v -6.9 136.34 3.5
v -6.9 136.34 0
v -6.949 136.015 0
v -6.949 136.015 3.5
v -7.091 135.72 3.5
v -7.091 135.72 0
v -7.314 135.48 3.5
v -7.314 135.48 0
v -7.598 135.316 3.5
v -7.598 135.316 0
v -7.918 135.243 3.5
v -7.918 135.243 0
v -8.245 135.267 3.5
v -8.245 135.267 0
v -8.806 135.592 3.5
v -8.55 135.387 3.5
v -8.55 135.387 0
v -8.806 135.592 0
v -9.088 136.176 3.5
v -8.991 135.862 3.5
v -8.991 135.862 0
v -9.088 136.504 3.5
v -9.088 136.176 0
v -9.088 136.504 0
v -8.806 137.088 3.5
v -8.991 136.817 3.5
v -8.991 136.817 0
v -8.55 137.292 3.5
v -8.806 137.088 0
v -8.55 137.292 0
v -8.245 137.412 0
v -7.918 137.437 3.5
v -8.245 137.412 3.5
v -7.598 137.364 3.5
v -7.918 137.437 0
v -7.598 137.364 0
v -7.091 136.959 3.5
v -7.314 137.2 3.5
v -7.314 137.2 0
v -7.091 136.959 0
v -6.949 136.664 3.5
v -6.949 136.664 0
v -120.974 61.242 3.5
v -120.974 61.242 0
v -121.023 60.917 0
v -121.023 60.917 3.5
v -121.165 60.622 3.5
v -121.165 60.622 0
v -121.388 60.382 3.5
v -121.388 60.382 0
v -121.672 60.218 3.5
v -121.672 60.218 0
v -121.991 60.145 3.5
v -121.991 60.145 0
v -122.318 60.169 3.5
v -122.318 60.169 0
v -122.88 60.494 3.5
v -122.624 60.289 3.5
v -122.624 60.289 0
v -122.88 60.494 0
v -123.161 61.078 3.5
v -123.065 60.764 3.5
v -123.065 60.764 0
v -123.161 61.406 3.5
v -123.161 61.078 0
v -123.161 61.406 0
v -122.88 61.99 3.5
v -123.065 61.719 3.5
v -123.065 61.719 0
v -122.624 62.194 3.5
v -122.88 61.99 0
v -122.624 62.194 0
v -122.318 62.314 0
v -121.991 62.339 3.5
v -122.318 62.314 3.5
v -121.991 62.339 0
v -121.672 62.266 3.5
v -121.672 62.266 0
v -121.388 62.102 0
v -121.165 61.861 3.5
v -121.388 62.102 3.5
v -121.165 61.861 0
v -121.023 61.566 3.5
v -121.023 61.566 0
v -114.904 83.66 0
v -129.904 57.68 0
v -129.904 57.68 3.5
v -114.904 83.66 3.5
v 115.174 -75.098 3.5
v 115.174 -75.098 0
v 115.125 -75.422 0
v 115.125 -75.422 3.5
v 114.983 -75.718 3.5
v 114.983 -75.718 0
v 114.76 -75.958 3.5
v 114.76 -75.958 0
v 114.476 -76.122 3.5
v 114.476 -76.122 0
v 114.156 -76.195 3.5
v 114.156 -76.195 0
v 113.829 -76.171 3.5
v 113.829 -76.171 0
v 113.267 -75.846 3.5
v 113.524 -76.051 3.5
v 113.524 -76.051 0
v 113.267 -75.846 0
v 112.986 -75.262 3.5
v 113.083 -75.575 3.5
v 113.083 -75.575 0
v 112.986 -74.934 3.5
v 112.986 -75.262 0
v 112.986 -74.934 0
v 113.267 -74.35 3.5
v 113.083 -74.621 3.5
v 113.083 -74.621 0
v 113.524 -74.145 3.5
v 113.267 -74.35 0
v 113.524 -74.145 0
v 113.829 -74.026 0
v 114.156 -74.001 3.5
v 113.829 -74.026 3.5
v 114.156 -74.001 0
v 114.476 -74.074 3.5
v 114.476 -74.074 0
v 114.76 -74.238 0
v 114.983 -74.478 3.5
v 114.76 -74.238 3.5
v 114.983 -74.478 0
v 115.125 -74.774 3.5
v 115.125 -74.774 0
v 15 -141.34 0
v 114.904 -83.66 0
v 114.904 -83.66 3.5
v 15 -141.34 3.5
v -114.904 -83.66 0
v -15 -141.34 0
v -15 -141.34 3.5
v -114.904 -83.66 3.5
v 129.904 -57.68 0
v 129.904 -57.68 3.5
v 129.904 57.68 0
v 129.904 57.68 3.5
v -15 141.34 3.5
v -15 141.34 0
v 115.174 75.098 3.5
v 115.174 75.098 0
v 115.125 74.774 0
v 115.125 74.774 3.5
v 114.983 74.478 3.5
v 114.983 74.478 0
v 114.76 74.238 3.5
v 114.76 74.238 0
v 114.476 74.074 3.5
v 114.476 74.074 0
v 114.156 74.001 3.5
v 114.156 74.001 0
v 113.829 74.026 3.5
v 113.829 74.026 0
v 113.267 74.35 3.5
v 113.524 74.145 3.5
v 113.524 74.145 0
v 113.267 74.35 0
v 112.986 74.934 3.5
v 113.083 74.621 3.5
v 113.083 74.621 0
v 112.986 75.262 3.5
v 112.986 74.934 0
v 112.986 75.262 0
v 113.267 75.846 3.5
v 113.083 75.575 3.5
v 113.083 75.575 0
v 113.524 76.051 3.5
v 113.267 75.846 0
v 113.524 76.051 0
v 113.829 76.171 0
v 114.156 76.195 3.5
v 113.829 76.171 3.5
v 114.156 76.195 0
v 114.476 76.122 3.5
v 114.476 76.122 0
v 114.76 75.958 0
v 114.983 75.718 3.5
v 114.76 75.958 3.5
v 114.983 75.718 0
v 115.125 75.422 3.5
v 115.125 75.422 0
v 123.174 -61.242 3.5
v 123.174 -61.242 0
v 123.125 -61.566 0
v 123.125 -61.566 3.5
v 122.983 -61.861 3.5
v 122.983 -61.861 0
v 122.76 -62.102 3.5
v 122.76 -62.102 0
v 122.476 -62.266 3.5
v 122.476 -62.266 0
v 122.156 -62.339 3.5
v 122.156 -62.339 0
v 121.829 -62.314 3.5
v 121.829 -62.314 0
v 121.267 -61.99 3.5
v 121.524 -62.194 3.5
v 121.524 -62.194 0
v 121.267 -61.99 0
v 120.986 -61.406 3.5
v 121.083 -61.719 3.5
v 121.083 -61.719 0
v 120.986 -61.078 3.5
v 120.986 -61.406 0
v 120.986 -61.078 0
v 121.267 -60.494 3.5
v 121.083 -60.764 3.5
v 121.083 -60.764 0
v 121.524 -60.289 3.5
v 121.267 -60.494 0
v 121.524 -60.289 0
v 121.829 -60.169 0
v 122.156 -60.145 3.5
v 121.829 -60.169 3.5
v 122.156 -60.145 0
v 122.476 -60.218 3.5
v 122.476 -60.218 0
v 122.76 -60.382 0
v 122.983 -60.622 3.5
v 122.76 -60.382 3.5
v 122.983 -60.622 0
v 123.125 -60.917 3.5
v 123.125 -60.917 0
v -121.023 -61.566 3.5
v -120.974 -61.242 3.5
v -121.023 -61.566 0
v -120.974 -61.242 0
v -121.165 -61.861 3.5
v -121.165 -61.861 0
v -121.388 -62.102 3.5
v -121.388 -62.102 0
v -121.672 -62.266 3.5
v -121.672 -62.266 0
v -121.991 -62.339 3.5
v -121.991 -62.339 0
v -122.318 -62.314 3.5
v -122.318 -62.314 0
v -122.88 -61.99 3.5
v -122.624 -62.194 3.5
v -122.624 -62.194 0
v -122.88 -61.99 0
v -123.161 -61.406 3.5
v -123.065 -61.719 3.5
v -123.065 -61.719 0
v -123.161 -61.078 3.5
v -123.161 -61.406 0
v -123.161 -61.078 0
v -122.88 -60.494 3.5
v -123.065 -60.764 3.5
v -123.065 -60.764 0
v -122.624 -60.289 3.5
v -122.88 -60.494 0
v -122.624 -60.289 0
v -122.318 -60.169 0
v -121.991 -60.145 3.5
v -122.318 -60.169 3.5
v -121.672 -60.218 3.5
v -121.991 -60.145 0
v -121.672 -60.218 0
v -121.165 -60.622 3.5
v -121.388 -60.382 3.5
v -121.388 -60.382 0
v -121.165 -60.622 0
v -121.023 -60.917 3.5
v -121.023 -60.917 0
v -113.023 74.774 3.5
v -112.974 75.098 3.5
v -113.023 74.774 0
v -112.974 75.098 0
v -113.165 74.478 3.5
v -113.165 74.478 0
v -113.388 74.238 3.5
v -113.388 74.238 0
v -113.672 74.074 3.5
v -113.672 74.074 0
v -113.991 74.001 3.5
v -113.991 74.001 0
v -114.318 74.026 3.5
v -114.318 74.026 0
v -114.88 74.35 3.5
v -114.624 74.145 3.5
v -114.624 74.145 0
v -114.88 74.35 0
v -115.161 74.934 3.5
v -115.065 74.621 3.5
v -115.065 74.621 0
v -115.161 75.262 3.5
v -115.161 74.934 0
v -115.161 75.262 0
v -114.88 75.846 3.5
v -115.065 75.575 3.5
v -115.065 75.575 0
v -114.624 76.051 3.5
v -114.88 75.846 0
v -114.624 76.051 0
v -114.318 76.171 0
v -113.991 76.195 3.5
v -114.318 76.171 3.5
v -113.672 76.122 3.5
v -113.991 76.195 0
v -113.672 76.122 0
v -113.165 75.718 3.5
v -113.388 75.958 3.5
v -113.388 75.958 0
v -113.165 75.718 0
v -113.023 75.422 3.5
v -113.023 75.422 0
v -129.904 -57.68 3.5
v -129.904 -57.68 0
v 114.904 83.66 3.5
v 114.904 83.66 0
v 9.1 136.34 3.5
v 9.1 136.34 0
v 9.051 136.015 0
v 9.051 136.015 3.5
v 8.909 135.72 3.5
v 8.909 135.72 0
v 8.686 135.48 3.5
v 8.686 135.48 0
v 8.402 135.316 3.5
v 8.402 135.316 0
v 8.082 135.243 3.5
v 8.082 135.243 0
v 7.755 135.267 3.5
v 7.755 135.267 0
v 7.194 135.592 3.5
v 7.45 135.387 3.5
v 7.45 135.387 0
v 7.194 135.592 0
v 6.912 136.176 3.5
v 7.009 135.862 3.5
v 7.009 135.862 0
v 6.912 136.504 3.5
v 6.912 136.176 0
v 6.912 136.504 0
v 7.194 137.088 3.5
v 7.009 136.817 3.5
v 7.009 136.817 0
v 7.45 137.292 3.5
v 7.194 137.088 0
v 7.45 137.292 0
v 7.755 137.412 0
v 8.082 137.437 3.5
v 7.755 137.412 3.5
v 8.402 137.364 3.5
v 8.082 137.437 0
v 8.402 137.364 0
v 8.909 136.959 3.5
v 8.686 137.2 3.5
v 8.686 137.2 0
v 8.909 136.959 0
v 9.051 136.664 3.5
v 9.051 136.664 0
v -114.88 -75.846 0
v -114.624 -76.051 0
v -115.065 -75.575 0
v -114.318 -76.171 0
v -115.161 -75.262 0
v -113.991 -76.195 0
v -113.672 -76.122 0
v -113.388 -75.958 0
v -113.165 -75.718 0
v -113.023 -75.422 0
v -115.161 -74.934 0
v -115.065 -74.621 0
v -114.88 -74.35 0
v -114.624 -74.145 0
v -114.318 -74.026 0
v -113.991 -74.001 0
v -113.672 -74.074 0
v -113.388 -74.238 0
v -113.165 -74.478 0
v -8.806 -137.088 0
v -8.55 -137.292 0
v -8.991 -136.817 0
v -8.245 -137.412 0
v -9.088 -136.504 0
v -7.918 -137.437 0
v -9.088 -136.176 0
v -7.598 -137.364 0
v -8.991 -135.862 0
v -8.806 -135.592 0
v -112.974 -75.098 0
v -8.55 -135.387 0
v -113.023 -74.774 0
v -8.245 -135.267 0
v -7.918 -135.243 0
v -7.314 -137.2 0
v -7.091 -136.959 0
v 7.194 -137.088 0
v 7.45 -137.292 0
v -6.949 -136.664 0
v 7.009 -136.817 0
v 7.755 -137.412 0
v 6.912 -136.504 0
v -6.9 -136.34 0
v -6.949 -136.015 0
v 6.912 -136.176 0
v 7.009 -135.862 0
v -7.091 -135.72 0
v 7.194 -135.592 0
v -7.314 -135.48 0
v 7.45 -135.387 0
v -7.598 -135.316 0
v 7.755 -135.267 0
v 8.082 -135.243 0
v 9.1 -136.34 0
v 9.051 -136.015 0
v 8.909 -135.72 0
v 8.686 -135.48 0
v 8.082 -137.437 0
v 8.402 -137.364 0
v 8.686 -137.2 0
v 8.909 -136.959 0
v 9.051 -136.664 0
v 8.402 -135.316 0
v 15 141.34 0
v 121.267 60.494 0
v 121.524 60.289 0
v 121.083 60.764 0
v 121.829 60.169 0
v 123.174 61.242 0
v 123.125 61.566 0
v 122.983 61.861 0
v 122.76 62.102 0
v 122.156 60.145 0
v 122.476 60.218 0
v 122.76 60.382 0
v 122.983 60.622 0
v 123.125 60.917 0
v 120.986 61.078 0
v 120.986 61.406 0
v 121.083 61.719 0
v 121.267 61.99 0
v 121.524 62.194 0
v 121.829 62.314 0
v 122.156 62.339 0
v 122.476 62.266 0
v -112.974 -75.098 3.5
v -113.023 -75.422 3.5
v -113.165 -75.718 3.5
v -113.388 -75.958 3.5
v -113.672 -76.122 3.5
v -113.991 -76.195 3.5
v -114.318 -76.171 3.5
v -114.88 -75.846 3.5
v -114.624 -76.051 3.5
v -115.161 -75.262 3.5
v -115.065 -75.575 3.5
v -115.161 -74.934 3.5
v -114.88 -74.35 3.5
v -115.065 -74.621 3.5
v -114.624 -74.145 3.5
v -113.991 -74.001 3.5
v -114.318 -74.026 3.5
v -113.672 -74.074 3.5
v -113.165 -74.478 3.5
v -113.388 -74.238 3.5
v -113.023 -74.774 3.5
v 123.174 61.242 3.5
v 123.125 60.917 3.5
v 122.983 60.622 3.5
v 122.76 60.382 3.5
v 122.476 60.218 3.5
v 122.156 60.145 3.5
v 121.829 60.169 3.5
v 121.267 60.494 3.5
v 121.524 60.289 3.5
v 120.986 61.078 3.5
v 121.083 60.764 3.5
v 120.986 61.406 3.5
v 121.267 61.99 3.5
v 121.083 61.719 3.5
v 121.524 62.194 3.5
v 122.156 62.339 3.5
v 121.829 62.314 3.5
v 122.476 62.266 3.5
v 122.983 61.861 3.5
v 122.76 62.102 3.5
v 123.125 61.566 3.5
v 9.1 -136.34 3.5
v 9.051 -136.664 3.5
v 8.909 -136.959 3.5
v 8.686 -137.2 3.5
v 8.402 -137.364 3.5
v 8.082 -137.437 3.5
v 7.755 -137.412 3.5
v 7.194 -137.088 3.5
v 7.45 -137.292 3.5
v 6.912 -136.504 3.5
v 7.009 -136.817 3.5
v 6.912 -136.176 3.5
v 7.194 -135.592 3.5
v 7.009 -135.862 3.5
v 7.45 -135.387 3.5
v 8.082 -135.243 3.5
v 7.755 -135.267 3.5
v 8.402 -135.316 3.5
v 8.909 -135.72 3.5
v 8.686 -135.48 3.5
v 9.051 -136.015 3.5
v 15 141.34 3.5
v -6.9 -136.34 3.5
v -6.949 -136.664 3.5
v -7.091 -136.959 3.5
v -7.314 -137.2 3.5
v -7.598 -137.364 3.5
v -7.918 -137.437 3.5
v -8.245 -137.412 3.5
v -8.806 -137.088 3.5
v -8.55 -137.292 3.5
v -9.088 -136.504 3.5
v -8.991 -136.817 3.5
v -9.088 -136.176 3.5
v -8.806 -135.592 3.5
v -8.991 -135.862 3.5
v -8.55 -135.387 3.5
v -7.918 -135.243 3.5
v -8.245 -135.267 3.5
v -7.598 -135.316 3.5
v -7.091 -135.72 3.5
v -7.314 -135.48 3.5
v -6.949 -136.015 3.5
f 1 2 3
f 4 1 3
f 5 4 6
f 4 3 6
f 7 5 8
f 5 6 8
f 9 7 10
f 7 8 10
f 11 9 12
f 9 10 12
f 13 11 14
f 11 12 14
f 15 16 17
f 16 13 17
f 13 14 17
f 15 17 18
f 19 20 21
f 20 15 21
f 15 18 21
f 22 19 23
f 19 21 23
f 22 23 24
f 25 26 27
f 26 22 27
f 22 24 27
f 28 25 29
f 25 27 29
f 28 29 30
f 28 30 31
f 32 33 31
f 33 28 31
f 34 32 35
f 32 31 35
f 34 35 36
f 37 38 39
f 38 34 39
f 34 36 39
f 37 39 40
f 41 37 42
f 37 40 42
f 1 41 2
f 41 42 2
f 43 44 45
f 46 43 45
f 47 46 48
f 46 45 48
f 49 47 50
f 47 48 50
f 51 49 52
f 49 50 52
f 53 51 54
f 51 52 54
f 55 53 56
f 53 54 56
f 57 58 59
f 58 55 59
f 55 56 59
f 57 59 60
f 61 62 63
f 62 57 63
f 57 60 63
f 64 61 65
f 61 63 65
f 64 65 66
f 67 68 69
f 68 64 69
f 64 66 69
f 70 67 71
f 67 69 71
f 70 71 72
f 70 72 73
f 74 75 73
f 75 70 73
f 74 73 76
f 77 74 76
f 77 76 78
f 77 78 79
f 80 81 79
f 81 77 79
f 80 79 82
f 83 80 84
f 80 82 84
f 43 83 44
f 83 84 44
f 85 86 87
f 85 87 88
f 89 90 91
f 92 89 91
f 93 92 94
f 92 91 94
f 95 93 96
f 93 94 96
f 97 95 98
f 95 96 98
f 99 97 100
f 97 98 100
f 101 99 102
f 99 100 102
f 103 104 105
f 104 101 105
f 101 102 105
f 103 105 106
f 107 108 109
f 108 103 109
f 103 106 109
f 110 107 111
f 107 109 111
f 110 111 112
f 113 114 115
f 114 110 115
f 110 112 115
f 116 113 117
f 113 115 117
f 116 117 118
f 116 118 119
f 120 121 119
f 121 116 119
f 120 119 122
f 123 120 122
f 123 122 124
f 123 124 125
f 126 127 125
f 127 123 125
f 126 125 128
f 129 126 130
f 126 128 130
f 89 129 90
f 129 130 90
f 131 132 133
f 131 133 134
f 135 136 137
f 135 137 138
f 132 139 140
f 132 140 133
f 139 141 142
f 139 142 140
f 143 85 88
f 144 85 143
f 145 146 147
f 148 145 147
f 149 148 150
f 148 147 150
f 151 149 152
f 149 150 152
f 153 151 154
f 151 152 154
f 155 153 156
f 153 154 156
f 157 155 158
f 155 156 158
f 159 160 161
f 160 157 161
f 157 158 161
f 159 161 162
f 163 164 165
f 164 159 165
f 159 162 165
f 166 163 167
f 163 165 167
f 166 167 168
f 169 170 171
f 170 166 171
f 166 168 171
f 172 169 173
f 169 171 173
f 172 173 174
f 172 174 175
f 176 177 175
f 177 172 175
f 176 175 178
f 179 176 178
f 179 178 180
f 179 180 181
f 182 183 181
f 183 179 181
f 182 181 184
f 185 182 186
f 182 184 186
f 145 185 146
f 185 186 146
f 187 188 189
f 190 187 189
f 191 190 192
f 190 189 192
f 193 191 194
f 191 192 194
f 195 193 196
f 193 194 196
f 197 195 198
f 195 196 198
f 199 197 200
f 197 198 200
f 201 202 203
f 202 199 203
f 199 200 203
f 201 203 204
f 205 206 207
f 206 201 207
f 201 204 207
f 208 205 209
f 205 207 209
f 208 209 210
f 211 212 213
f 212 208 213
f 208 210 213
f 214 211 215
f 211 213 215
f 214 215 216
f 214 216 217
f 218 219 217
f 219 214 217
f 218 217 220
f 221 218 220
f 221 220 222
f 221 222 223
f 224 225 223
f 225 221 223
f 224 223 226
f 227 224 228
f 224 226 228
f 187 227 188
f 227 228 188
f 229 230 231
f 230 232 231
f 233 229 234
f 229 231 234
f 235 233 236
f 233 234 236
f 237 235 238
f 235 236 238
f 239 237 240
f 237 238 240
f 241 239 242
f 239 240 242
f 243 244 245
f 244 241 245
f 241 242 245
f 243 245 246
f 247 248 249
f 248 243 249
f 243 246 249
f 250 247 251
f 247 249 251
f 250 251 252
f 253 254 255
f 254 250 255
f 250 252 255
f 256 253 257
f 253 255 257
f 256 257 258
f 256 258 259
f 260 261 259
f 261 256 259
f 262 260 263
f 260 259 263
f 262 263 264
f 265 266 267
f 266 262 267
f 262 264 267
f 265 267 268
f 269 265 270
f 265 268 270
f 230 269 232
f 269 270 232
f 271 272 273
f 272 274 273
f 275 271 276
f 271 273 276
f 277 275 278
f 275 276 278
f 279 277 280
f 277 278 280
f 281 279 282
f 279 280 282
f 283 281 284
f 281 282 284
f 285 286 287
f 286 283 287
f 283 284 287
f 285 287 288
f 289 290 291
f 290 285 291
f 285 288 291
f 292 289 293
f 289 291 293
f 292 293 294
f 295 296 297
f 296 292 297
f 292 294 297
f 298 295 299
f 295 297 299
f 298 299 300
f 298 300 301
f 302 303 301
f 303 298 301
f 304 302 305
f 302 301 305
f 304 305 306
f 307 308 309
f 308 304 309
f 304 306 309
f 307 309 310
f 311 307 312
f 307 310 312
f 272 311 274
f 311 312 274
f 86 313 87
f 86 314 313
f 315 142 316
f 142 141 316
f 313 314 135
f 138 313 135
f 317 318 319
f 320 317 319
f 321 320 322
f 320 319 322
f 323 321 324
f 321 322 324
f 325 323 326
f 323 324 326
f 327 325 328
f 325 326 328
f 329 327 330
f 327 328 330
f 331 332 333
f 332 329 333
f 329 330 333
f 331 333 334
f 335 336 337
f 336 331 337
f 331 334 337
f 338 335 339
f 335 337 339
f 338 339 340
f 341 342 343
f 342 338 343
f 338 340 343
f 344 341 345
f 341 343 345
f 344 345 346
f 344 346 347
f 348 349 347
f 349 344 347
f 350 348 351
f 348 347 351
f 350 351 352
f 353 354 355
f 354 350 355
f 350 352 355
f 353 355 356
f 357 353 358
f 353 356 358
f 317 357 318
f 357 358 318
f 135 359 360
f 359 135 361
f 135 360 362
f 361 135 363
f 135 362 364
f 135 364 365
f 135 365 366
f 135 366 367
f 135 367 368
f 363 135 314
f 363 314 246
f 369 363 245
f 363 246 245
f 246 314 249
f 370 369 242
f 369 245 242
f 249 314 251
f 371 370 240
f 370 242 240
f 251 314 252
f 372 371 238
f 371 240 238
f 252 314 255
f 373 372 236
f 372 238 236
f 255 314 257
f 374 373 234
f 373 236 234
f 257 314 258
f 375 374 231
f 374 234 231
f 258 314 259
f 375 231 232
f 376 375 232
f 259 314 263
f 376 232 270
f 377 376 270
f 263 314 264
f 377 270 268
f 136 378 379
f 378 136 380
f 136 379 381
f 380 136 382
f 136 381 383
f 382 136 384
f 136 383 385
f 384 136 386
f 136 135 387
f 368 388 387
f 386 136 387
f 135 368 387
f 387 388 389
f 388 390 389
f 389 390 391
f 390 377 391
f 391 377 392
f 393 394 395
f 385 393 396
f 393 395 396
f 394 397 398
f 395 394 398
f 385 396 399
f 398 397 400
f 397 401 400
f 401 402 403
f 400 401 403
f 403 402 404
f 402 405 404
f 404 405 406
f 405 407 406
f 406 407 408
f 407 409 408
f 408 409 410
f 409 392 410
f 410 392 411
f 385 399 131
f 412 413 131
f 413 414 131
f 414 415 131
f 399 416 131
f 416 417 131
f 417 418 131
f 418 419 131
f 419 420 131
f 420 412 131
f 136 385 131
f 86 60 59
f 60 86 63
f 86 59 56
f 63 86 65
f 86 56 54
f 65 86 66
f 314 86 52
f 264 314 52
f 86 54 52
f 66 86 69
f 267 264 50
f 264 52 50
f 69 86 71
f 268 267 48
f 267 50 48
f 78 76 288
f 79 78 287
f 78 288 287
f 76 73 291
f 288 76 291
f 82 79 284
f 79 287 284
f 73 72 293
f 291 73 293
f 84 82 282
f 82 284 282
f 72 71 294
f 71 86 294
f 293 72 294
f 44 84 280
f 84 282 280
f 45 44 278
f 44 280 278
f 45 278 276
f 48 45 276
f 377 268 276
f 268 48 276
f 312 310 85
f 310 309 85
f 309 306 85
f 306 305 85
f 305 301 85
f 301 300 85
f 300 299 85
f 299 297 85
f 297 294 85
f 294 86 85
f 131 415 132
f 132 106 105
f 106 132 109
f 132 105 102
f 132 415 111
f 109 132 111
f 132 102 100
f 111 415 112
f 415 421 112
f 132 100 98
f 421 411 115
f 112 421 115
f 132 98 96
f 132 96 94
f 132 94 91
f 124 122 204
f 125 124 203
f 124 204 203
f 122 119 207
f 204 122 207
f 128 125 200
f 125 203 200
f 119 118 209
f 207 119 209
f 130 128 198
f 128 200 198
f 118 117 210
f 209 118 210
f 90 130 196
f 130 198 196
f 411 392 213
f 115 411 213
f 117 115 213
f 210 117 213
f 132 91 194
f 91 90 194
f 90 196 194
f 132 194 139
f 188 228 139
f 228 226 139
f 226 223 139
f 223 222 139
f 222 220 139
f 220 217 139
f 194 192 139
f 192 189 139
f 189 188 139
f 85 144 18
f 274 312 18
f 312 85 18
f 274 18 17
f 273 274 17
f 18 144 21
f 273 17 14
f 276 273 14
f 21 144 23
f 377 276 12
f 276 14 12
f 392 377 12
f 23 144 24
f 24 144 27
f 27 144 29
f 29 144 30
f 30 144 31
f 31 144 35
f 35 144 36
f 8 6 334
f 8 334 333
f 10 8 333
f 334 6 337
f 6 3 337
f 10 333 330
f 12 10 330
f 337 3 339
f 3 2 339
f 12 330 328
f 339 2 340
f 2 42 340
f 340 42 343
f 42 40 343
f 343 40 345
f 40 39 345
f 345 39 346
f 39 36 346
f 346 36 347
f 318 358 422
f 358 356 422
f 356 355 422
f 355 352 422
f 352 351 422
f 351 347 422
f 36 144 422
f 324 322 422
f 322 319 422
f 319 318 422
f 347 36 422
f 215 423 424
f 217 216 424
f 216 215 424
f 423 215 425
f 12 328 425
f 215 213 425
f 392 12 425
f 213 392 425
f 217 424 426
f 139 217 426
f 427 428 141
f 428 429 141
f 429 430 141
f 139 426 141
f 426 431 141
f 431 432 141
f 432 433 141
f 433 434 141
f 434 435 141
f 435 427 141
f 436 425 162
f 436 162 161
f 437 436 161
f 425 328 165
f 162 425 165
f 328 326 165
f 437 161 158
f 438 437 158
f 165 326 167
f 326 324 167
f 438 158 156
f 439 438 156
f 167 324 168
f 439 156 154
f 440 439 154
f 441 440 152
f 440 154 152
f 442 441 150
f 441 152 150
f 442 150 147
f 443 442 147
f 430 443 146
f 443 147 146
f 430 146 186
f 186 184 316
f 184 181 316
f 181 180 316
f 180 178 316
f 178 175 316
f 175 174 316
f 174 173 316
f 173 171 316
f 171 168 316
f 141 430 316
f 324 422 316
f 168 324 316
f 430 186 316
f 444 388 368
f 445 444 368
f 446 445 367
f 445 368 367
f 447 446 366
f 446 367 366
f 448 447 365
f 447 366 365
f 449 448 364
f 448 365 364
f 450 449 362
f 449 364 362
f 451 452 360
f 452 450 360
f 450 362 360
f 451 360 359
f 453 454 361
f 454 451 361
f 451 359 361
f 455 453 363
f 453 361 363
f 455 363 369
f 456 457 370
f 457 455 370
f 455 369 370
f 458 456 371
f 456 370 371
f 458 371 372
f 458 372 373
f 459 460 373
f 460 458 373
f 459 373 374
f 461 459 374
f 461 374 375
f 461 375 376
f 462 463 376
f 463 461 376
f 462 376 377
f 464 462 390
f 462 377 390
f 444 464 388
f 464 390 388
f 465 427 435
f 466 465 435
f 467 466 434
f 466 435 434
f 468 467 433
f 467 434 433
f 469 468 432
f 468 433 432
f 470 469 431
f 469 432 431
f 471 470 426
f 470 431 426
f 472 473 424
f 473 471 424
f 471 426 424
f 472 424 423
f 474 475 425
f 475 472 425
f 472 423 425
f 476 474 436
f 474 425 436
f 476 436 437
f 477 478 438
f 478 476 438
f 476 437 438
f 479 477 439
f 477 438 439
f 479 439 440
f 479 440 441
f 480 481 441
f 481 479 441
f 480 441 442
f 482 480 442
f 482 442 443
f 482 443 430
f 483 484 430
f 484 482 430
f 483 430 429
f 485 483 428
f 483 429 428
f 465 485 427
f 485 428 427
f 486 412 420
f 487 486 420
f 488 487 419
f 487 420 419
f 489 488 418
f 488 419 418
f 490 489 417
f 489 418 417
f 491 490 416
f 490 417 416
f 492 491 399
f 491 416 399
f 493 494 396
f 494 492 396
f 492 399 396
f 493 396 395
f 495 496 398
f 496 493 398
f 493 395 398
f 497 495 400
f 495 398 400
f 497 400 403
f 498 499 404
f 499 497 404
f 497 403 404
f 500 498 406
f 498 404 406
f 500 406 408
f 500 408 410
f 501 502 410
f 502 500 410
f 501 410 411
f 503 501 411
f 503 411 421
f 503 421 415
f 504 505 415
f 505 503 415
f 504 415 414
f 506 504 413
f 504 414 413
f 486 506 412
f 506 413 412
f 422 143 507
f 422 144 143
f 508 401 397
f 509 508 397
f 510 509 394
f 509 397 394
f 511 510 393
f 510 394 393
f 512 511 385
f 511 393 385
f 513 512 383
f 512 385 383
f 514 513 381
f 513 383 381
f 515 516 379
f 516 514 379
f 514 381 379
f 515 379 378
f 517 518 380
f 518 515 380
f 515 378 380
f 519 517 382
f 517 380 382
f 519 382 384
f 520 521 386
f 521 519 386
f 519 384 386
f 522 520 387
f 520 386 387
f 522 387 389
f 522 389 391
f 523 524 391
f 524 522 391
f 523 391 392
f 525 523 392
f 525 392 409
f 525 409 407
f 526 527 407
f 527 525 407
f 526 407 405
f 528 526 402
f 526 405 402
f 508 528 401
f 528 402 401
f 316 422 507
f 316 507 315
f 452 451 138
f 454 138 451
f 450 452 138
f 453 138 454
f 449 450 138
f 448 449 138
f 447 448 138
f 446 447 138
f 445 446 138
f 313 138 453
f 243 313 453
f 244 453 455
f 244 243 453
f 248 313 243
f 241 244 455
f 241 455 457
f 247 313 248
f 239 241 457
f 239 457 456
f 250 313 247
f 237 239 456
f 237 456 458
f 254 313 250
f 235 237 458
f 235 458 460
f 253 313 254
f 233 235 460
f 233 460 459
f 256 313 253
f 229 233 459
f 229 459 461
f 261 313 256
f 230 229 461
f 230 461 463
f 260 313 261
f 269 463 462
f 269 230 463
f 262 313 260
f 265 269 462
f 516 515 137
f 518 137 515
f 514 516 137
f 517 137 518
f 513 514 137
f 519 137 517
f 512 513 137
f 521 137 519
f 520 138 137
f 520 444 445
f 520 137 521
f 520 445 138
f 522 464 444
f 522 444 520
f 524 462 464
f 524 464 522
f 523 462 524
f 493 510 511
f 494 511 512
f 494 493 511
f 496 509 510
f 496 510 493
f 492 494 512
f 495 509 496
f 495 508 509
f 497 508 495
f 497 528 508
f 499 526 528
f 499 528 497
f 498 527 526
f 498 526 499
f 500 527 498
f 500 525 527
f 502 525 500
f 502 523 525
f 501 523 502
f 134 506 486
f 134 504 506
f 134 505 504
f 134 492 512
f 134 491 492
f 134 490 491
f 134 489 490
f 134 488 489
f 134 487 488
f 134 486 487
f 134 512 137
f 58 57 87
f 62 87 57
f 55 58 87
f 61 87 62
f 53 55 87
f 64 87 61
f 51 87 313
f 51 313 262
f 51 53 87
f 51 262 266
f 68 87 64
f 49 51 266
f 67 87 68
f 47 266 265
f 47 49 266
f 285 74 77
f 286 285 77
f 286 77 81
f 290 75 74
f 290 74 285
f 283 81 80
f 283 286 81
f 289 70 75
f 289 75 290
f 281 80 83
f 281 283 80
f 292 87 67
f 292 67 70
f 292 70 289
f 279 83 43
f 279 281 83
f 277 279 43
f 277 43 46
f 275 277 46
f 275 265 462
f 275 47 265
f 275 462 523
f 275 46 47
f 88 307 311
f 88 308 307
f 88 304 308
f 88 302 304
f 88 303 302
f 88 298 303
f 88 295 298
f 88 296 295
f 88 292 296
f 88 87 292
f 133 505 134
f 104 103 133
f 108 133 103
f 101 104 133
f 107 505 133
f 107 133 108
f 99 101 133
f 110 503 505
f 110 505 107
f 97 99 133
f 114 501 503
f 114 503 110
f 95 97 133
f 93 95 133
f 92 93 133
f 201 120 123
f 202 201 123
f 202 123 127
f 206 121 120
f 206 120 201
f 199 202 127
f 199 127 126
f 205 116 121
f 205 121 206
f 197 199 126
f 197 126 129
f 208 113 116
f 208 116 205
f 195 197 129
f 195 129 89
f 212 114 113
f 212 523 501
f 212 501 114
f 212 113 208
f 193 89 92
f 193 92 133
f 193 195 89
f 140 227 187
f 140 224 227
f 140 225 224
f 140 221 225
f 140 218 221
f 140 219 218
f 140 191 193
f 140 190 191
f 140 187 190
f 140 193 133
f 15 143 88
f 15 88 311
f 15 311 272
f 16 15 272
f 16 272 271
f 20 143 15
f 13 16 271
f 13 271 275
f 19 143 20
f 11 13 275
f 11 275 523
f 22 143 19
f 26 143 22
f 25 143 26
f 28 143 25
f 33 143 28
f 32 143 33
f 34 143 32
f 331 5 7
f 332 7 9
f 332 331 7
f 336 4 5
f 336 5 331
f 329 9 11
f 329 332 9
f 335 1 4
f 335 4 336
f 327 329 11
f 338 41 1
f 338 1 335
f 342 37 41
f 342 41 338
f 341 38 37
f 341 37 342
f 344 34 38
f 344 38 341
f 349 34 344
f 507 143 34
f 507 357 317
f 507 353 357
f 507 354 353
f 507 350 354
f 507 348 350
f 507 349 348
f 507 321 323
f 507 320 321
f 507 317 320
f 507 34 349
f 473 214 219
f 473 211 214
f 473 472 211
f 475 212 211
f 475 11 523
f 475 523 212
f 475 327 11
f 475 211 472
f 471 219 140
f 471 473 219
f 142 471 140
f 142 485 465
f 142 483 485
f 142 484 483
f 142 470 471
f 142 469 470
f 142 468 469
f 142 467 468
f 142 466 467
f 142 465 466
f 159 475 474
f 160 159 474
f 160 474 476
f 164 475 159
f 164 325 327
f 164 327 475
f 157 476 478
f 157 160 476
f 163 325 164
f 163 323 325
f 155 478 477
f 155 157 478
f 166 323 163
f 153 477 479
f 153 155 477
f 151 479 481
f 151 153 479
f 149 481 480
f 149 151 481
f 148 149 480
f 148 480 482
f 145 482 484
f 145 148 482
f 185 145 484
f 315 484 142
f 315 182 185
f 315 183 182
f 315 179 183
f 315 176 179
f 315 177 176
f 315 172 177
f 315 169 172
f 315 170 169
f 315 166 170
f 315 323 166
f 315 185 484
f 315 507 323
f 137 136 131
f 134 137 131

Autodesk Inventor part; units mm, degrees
ref_plane "YZ Plane" through (0, 0, 0) normal (1, 0, 0) x (0, 1, 0)
ref_plane "XZ Plane" through (0, 0, 0) normal (0, 1, 0) x (-1, 0, 0)
ref_plane "XY Plane" through (0, 0, 0) normal (0, 0, 1) x (1, 0, 0)
sketch "Sketch1" plane through (0, 0, 0) normal (0, 0, 1) x (1, 0, 0)
  circle A0 centre (0, 0) radius 150 construction
  line L0 (0, -150) -> (-129.9038, -75)
  line L1 (-129.9038, -75) -> (-129.9038, 75)
  line L2 (-129.9038, 75) -> (0, 150)
  line L3 (0, 150) -> (129.9038, 75)
  line L4 (129.9038, 75) -> (129.9038, -75)
  line L5 (129.9038, -75) -> (0, -150)
  circle A1 centre (0, 0) radius 6.154 construction
  line L6 (30, 0) -> (15, -25.9808) construction
  line L7 (15, -25.9808) -> (-15, -25.9808) construction
  line L8 (-15, -25.9808) -> (-30, 0) construction
  line L9 (-30, 0) -> (-15, 25.9808) construction
  line L10 (-15, 25.9808) -> (15, 25.9808) construction
  line L11 (15, 25.9808) -> (30, 0) construction
  line L12 (-129.9038, 57.6795) -> (-114.9038, 83.6603)
  line L13 (-15, 141.3397) -> (15, 141.3397)
  line L14 (129.9038, 57.6795) -> (114.9038, 83.6603)
  line L15 (129.9038, -57.6795) -> (114.9038, -83.6603)
  line L16 (-15, -141.3397) -> (15, -141.3397)
  line L17 (-129.9038, -57.6795) -> (-114.9038, -83.6603)
  line L18 (-129.9038, 75) -> (129.9038, -75) construction
  line L19 (-125.9038, 81.9282) -> (133.9038, -68.0718) construction
  line L20 (-133.9038, 68.0718) -> (125.9038, -81.9282) construction
  line L21 (-125.5737, 55.1795) -> (-110.5737, 81.1603) construction
  circle A2 centre (-114.0737, 75.0981) radius 1.1
  circle A3 centre (-122.0737, 61.2417) radius 1.1
  line L22 (-133.9038, -68.0718) -> (125.9038, 81.9282) construction
  line L23 (-129.9038, -75) -> (129.9038, 75) construction
  line L24 (-125.9038, -81.9282) -> (133.9038, 68.0718) construction
  line L25 (-110.5737, -81.1603) -> (-125.5737, -55.1795) construction
  circle A4 centre (-114.0737, -75.0981) radius 1.1
  circle A5 centre (-122.0737, -61.2417) radius 1.1
  line L26 (-8, -150) -> (-8, 150) construction
  line L27 (0, -150) -> (0, 150) construction
  line L28 (8, -150) -> (8, 150) construction
  line L29 (15, -136.3397) -> (-15, -136.3397) construction
  circle A6 centre (8, -136.3397) radius 1.1
  circle A7 centre (-8, -136.3397) radius 1.1
  line L30 (125.9038, -81.9282) -> (-133.9038, 68.0718) construction
  line L31 (129.9038, -75) -> (-129.9038, 75) construction
  line L32 (133.9038, -68.0718) -> (-125.9038, 81.9282) construction
  line L33 (125.5737, -55.1795) -> (110.5737, -81.1603) construction
  circle A8 centre (122.0737, -61.2417) radius 1.1
  circle A9 centre (114.0737, -75.0981) radius 1.1
  line L34 (133.9038, 68.0718) -> (-125.9038, -81.9282) construction
  line L35 (129.9038, 75) -> (-129.9038, -75) construction
  line L36 (125.9038, 81.9282) -> (-133.9038, -68.0718) construction
  line L37 (110.5737, 81.1603) -> (125.5737, 55.1795) construction
  circle A10 centre (114.0737, 75.0981) radius 1.1
  circle A11 centre (122.0737, 61.2417) radius 1.1
  line L38 (8, 150) -> (8, -150) construction
  line L39 (0, 150) -> (0, -150) construction
  line L40 (-8, 150) -> (-8, -150) construction
  line L41 (-15, 136.3397) -> (15, 136.3397) construction
  circle A12 centre (-8, 136.3397) radius 1.1
  circle A13 centre (8, 136.3397) radius 1.1
  dimension "d5" = 300
  dimension "d6" = 30
  dimension "d7" = 30
  dimension "d8" = 30
  dimension "d9" = 30
  dimension "d10" = 30
  dimension "d11" = 30
  dimension "d12" = 30
  dimension "d17" = 8
  dimension "d18" = 8
  dimension "d19" = 5
  dimension "d20" = 2.2
  dimension "d21" = 2.2
  dimension "d24" = 360
extrude "Extrusion1" add sketch "Sketch1" along normal blind 3.5 contours L0 L17 L1 L12 L2 L13 L3 L14 L4 L15 L5 L16
properties part number "Body_Plate"
